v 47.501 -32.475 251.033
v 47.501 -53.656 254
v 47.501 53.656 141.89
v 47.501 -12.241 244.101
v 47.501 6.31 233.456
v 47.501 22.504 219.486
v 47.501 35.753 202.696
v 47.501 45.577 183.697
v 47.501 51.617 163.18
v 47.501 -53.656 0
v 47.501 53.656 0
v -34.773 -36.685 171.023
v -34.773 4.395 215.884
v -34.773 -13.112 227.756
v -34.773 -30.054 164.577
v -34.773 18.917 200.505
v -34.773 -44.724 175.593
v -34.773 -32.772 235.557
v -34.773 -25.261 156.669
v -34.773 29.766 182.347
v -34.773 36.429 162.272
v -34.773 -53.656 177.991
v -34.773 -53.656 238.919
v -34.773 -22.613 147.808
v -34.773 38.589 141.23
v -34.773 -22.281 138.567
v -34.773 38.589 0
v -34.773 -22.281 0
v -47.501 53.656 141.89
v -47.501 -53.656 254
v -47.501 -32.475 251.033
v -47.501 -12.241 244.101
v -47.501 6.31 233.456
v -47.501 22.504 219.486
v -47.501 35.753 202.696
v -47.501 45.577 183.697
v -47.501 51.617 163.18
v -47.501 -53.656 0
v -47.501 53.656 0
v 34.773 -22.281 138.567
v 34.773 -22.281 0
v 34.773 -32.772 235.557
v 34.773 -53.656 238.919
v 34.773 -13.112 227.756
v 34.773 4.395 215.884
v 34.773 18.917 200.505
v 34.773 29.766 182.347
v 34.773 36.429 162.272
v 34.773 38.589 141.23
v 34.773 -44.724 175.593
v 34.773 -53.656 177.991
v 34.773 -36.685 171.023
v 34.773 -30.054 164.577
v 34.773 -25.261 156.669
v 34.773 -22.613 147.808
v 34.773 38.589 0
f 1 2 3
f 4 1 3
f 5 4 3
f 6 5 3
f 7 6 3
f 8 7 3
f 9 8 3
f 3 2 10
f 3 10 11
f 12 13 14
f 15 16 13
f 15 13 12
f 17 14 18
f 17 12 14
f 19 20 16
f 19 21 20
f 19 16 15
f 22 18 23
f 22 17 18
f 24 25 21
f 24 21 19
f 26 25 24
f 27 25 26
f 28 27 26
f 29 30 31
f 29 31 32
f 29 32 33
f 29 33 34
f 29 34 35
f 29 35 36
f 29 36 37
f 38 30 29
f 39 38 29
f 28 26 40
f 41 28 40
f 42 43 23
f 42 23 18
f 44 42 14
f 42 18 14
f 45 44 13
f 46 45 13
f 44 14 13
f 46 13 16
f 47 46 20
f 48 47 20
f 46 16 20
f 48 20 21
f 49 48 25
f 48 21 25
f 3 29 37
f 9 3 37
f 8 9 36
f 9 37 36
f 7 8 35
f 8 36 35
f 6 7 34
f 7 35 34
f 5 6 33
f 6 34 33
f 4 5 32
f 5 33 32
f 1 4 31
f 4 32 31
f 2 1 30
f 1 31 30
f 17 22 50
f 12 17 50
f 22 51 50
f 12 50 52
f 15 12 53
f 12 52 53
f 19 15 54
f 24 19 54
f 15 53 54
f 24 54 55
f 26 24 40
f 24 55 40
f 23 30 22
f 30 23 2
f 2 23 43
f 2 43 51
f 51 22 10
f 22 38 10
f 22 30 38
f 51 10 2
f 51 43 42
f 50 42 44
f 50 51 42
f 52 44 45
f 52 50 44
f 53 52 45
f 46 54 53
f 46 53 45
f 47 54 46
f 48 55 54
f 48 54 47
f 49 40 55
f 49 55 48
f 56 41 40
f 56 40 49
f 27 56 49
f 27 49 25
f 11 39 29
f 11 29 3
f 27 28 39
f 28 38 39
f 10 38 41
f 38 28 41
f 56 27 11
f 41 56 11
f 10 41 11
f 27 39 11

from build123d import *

# Parameters (mm, degrees)
F0_W        = 95.0020104647
F0_H        = 107.3112413287
F1_DEPTH    = 254
F2_T1_DEPTH = 655.5528673222
F3_W        = 69.5454850793
F3_H        = 60.9275996685


# Not quite as in the source:
# - a fillet or chamfer that OpenCascade refuses, or shapes differently, is made with other operations: its cross-section is extruded or revolved along the edge and cut away or added


with BuildPart() as f1:
    # F0 (on Top) → F1 (new body)
    with BuildSketch(Plane.XY):
        Rectangle(F0_W, F0_H)
    extrude(amount=F1_DEPTH)

    # F2: fillet of radius 112.2174748062 on 1 edges, made by hand

    # F2_s2 → F2_t1 (cut)
    with BuildSketch(Plane.YZ.offset(-327.7764336611)):
        with BuildLine():
            ThreePointArc((53.6556206644, 141.8898286285), (22.5039425406, 219.4855647234), (-53.6556206644, 254))
            Line((-53.6556206644, 254), (53.6556206644, 254))
            Line((53.6556206644, 254), (53.6556206644, 141.8898286285))
        make_face()
    extrude(amount=F2_T1_DEPTH, mode=Mode.SUBTRACT)

    # F4: sweep along a path in F4_path
    with BuildLine(Plane(origin=(-47.5010052323, -53.6556206644, 254), x_dir=(0, 0, 1), z_dir=(1, 0, 0))) as f4_path:
        ThreePointArc((0, 0), (-34.5144352766, -76.159563205), (-112.1101713715, -107.3112413288))
        Line((-112.1101713715, -107.3112413288), (-254, -107.3112413288))
    # F3 (on face) → F4 (sweep, cut)
    with BuildSketch(Plane.XZ.offset(53.6556206644)):
        with Locations((0, 208.4547877312)):
            Rectangle(F3_W, F3_H)
    sweep(path=f4_path.line, mode=Mode.SUBTRACT)


solid = f1.part
